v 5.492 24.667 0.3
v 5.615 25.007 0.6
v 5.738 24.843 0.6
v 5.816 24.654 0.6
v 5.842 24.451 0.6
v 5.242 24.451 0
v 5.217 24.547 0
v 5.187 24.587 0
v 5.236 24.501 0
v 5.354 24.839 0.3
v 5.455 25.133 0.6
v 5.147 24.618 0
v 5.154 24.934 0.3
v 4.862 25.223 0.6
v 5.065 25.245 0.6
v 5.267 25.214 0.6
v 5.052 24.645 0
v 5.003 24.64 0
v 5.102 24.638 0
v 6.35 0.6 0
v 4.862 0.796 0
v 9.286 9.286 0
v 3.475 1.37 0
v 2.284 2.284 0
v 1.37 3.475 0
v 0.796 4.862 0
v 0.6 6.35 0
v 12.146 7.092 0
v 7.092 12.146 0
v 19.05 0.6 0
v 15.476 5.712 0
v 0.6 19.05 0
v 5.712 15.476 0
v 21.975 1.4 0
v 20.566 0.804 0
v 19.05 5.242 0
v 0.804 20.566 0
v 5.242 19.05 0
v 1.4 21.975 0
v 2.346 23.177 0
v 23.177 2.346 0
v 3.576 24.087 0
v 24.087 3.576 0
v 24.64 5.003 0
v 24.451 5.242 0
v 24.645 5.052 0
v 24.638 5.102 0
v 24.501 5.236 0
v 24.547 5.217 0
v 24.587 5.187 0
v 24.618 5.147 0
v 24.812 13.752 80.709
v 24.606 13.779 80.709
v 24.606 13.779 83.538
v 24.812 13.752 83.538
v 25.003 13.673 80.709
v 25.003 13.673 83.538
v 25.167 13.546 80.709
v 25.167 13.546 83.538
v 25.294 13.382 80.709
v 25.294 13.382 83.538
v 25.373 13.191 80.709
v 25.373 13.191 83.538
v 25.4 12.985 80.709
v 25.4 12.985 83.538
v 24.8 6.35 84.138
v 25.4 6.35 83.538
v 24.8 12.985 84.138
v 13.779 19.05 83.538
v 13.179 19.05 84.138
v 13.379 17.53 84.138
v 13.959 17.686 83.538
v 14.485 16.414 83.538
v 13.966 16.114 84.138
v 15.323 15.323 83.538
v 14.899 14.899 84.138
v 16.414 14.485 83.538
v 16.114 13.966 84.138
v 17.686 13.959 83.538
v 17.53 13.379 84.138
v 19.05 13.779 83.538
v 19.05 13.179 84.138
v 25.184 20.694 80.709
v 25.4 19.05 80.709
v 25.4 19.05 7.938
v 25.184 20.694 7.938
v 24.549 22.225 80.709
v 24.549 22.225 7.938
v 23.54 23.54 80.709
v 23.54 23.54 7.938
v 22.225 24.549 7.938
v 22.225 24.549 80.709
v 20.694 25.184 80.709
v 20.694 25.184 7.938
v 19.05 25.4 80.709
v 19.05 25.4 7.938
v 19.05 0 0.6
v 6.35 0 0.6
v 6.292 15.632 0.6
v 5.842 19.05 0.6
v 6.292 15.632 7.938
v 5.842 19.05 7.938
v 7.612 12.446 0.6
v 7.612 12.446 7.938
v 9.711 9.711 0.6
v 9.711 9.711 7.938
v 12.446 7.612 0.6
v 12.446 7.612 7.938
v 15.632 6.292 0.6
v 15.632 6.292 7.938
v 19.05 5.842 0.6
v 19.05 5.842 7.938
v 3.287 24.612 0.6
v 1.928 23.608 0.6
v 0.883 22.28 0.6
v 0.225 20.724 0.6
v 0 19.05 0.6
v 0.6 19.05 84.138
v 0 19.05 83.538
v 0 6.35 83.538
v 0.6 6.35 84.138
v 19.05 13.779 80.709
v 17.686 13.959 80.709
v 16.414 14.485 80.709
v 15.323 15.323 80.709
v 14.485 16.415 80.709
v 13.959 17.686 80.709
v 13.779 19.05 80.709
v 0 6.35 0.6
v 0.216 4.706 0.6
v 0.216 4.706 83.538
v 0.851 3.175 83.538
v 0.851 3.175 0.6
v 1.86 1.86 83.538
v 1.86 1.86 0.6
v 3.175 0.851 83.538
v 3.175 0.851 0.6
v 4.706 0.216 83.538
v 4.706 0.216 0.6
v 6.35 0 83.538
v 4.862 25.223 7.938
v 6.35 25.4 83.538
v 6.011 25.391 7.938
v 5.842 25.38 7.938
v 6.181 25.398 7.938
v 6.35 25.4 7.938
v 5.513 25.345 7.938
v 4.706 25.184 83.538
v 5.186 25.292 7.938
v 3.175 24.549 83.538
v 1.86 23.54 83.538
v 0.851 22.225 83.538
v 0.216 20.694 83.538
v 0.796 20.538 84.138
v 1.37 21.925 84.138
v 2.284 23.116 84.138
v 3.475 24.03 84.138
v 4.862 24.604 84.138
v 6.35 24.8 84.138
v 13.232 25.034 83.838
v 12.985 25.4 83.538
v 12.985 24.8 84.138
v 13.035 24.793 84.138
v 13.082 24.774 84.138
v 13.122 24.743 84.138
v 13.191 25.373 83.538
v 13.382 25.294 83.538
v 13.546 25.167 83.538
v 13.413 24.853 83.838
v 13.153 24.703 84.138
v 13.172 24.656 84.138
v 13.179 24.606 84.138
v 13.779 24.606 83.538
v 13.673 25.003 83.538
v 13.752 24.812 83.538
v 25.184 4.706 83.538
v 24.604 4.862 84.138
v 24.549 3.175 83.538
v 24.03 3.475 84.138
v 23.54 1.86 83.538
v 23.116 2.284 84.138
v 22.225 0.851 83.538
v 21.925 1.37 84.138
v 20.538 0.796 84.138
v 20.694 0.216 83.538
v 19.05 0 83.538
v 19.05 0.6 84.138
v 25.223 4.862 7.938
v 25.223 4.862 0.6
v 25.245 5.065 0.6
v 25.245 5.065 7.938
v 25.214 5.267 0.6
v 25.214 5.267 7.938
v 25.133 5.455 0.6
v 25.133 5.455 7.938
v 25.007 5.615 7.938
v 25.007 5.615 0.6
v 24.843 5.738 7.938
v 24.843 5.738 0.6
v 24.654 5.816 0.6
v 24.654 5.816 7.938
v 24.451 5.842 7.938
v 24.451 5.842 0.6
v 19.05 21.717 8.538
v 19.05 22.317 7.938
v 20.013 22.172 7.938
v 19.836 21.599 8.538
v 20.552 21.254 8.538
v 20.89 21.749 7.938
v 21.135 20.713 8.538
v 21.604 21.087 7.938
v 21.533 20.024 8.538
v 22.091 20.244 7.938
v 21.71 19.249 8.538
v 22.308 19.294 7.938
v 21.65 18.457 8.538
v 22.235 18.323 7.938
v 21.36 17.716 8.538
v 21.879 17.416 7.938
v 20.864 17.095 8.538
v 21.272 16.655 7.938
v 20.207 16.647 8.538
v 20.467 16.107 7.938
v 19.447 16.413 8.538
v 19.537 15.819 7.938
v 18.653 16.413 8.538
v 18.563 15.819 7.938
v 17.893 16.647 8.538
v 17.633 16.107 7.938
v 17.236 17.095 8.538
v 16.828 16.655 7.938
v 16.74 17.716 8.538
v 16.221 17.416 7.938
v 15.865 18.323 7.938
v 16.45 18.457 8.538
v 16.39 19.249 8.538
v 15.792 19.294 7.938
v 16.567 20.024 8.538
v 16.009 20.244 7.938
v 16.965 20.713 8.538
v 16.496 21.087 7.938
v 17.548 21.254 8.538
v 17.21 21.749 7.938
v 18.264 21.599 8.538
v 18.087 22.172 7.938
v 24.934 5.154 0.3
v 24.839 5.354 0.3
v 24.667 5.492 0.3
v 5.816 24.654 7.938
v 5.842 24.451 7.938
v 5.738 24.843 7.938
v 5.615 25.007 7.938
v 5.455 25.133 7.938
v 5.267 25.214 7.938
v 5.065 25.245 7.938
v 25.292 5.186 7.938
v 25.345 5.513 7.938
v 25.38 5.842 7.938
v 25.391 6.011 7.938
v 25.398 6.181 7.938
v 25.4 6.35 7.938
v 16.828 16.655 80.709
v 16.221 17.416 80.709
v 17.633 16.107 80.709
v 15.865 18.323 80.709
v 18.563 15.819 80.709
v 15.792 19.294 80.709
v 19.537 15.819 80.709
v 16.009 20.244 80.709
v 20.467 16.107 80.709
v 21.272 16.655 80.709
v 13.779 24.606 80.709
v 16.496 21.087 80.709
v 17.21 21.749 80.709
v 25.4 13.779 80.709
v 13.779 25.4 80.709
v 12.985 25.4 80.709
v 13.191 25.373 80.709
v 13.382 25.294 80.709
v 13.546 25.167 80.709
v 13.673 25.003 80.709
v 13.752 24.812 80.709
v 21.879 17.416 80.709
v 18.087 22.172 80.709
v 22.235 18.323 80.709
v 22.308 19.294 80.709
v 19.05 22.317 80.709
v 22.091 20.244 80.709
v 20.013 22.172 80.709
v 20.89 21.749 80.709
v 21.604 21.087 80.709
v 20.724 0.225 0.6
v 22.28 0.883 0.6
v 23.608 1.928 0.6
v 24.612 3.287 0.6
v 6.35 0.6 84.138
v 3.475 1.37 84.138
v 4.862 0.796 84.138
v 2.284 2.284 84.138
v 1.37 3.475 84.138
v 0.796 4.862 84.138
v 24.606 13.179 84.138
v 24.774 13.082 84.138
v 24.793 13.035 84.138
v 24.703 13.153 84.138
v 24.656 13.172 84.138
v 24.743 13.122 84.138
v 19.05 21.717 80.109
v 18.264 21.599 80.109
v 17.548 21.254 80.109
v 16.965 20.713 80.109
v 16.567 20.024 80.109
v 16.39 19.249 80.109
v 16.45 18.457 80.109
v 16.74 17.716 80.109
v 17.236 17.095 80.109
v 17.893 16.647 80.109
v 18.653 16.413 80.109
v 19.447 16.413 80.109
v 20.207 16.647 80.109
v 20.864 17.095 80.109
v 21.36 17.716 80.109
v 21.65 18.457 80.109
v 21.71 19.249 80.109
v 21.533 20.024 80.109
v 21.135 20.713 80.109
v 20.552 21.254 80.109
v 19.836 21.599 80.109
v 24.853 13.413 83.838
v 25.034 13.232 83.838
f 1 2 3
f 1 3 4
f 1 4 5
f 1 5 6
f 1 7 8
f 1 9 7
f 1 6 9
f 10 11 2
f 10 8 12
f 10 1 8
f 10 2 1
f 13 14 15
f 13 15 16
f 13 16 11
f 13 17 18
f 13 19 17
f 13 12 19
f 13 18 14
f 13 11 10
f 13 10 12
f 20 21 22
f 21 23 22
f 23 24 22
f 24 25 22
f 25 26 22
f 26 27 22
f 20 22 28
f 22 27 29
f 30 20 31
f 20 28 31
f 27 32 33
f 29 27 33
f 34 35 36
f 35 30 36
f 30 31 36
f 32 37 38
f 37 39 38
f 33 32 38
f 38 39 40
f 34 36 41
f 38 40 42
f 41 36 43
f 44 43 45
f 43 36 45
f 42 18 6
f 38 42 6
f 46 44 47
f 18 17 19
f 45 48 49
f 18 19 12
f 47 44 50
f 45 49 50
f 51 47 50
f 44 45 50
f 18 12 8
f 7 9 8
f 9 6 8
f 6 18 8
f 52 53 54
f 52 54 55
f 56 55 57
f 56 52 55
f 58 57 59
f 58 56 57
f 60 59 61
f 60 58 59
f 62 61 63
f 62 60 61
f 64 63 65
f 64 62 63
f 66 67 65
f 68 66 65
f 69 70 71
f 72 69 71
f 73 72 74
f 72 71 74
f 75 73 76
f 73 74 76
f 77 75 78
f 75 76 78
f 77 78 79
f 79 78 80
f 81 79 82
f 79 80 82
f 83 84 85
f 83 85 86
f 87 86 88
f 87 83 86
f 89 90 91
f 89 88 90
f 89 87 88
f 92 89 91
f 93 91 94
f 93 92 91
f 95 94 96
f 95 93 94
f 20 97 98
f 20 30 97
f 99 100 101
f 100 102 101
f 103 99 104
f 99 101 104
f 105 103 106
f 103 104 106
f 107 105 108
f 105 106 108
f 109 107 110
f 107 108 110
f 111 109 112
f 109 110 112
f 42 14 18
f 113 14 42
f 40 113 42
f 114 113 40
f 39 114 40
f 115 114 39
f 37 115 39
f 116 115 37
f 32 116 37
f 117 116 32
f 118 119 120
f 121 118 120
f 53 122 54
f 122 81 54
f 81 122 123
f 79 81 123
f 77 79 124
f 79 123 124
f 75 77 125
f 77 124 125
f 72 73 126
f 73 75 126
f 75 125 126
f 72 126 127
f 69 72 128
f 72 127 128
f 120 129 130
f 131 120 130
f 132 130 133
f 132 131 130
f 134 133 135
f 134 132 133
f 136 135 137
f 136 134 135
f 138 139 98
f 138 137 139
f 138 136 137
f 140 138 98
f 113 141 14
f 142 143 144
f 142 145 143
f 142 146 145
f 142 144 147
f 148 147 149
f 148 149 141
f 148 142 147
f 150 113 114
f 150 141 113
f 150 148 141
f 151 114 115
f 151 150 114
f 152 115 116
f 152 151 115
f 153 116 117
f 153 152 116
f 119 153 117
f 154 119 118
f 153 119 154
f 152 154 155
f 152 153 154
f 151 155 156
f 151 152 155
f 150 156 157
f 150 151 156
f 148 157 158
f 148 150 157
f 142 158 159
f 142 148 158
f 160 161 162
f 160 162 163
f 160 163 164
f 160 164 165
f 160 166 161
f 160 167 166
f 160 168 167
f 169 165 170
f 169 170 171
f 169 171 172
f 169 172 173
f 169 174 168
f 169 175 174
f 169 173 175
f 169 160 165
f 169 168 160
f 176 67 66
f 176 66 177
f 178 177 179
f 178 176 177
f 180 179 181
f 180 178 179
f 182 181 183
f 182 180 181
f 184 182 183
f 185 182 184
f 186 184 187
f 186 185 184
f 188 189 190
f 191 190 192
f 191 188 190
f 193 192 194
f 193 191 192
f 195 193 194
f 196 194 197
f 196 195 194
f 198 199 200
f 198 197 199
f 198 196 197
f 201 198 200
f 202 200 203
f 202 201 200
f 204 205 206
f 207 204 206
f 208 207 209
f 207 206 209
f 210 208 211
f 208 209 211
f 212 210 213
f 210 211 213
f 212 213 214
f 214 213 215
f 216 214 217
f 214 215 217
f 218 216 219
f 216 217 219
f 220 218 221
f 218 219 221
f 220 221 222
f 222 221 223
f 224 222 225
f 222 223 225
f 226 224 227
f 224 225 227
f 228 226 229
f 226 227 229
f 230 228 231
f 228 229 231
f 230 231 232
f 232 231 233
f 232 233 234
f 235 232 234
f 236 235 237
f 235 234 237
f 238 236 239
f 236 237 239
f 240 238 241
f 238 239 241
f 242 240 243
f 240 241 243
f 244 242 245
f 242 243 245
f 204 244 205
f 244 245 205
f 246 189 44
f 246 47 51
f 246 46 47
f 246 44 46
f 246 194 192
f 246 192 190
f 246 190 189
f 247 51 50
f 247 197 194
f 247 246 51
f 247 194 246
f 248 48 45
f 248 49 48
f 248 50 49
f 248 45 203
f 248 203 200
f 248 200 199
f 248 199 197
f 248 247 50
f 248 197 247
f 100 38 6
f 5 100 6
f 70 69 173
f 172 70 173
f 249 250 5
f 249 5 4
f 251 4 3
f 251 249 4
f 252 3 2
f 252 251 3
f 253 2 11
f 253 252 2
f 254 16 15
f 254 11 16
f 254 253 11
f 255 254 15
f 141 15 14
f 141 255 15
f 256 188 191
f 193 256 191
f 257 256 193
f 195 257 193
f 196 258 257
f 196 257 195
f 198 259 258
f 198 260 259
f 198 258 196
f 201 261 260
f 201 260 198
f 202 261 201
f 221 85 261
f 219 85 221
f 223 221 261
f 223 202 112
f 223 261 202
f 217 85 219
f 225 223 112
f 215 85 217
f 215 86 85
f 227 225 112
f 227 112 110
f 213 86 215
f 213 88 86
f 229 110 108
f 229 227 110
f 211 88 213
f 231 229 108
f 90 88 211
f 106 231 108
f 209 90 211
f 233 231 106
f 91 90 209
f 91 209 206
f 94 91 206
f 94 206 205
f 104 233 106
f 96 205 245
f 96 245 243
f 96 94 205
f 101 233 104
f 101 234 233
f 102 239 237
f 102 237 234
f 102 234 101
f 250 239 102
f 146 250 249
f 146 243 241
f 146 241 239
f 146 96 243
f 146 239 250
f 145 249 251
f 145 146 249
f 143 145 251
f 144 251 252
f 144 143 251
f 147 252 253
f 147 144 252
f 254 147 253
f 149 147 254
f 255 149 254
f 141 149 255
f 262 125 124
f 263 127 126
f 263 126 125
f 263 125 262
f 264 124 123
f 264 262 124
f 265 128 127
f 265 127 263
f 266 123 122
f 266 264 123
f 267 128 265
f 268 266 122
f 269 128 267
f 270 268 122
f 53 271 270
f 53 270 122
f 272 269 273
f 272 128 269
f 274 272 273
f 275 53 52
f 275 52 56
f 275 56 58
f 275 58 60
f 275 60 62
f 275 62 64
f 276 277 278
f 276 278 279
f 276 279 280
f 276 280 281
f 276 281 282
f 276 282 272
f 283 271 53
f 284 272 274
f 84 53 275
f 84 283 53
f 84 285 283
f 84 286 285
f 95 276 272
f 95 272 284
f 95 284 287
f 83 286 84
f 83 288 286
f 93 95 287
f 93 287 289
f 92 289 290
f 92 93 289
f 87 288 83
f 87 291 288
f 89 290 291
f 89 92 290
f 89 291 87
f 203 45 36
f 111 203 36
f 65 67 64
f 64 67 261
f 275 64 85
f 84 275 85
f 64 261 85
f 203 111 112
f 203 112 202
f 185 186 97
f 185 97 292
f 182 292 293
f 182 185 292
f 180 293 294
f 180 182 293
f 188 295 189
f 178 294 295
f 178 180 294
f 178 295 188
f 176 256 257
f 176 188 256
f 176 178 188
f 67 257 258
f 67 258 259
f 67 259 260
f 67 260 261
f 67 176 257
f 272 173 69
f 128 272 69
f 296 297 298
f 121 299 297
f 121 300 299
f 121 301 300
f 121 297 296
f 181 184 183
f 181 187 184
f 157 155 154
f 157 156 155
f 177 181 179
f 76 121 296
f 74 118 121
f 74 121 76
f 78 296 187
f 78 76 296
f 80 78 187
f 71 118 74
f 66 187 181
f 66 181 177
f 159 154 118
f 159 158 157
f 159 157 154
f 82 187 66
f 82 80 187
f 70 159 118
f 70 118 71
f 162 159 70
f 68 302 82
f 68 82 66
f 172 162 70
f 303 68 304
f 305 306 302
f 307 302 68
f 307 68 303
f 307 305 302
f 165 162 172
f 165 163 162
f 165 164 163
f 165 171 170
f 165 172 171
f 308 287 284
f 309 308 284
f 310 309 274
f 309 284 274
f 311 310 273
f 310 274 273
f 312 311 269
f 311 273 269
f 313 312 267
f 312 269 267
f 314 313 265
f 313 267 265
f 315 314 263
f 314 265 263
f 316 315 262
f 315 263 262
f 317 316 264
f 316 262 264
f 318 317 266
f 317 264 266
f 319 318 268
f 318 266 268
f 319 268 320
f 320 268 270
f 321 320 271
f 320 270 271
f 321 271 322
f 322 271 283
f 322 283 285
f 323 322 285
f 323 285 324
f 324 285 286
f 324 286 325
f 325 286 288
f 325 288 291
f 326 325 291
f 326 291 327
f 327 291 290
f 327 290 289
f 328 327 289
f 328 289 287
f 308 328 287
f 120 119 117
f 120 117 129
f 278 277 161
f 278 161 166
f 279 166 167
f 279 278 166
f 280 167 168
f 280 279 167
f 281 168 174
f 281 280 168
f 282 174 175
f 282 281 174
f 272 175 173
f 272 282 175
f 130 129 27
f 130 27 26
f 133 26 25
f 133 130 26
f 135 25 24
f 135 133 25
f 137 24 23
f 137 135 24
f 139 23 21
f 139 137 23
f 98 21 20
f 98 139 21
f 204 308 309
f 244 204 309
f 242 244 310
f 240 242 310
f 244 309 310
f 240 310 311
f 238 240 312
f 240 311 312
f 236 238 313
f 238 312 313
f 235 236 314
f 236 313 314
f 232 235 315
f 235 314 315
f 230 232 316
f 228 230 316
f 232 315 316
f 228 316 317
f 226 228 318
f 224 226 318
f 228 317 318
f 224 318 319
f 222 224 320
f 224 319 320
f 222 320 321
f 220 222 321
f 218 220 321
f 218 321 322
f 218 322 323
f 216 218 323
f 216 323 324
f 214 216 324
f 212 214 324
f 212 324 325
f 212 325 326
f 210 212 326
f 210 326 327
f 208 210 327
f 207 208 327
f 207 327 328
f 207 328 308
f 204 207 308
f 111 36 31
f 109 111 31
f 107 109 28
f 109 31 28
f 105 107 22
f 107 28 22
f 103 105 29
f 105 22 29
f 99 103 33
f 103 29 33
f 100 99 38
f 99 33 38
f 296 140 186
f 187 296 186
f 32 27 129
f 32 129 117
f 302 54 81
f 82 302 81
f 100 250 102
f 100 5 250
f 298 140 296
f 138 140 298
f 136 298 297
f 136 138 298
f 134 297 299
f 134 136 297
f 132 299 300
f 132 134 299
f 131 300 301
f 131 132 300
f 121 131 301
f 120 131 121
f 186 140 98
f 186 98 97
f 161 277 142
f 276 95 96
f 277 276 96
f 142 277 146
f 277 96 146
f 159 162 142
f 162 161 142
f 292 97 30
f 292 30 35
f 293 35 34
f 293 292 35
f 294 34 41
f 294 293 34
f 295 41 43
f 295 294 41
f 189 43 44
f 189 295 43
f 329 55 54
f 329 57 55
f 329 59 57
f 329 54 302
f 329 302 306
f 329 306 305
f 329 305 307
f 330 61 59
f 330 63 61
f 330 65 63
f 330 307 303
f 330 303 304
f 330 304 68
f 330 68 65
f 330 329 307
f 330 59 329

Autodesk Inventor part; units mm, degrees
ref_plane "YZ Plane" through (0, 0, 0) normal (1, 0, 0) x (0, 1, 0)
ref_plane "XZ Plane" through (0, 0, 0) normal (0, 1, 0) x (-1, 0, 0)
ref_plane "XY Plane" through (0, 0, 0) normal (0, 0, 1) x (1, 0, 0)
sketch "Sketch1" plane through (0, 0, 0) normal (0, 0, 1) x (1, 0, 0)
  line L0 (0, 0) -> (25.4, 0)
  line L1 (25.4, 0) -> (25.4, 25.4)
  line L2 (25.4, 25.4) -> (0, 25.4)
  line L3 (0, 25.4) -> (0, 0)
  dimension "d0" = 25.4
  dimension "d1" = 25.4
extrude "Extrusion1" add sketch "Sketch1" along normal blind 84.138
sketch "Sketch2" plane through (0, 0, 84.138) normal (0, 0, 1) x (1, 0, 0)
  line L0 (25.4, 25.4) -> (0, 25.4) projected
  line L1 (25.4, 25.4) -> (13.779, 25.4)
  line L2 (13.779, 25.4) -> (13.779, 13.779)
  line L3 (13.779, 13.779) -> (25.4, 13.779)
  line L4 (25.4, 13.779) -> (25.4, 25.4)
  point P0 (0, 0)
  dimension "d4" = 11.621
  dimension "d5" = 11.621
extrude "Extrusion2" cut sketch "Sketch2" against normal blind 3.429
sketch "Sketch3" plane through (0, 0, 0) normal (0, 0, -1) x (-1, 0, 0)
  line L0 (-25.4, 25.4) -> (-25.4, 13.779) projected
  line L1 (-25.4, 25.4) -> (-5.842, 25.4)
  line L2 (-5.842, 25.4) -> (-5.842, 5.842)
  line L3 (-5.842, 5.842) -> (-25.4, 5.842)
  line L4 (-25.4, 5.842) -> (-25.4, 25.4)
  point P0 (0, 0)
  dimension "d8" = 19.558
  dimension "d9" = 19.558
extrude "Extrusion3" cut sketch "Sketch3" against normal blind 7.938
sketch "Sketch4" plane through (0, 0, 7.938) normal (0, 0, -1) x (-1, 0, 0)
  line L0 (-25.4, 25.4) -> (-5.842, 25.4) projected
  line L1 (-25.4, 5.842) -> (-25.4, 25.4) projected
  point P0 (0, 0)
  point P1 (-19.05, 19.05)
  dimension "d12" = 6.35
  dimension "d13" = 6.35
hole "Hole1" at (19.05, 19.05, 7.938) direction (0, 0, 1) diameter 5.334 end through all clearance for "Flat Head Machine Screw (82)" size "#10" standard "Ansi Unified Screw Threads"
fillet "Fillet1" radius 6.35 4 edges at (0, 25.4, 42.069) (25.4, 25.4, 44.3235) (0, 0, 42.069) (25.4, 0, 42.069)
fillet "Fillet2" radius 0.794 4 edges at (25.3796, 5.842, 3.969) (5.842, 25.3796, 3.969) (25.4, 13.779, 82.4235) (13.779, 25.4, 82.4235)
fillet "Fillet3" radius 5.271 1 edges at (13.779, 13.779, 82.4235)
fillet "Fillet4" radius 13.208 1 edges at (5.842, 5.842, 3.969)
chamfer "Chamfer1" distance 0.6 angle 45 24 edges at (19.05, 16.383, 7.938) (9.7105, 9.7105, 0) (5.842, 21.7506, 0) (5.5393, 25.0751, 0) (1.3614, 22.9789, 0) (0, 12.7, 0) (1.8599, 1.8599, 0) (12.7, 0, 0) (22.9789, 1.3614, 0) (25.0751, 5.5393, 0) (21.7506, 5.842, 0) (19.05, 16.383, 80.709) (21.828, 13.779, 84.138) (15.3228, 15.3228, 84.138) (13.779, 21.828, 84.138) (13.5464, 25.1674, 84.138) (9.6675, 25.4, 84.138) (1.8599, 23.5401, 84.138) (0, 12.7, 84.138) (1.8599, 1.8599, 84.138) (12.7, 0, 84.138) (23.5401, 1.8599, 84.138) (25.4, 9.6675, 84.138) (25.1674, 13.5464, 84.138)
equation "\"d5\" = d4"
equation "\"d9\" = d8"
equation "\"d13\" = d12"
properties part number "Corner-001" material "PC/ABS Plastic"
